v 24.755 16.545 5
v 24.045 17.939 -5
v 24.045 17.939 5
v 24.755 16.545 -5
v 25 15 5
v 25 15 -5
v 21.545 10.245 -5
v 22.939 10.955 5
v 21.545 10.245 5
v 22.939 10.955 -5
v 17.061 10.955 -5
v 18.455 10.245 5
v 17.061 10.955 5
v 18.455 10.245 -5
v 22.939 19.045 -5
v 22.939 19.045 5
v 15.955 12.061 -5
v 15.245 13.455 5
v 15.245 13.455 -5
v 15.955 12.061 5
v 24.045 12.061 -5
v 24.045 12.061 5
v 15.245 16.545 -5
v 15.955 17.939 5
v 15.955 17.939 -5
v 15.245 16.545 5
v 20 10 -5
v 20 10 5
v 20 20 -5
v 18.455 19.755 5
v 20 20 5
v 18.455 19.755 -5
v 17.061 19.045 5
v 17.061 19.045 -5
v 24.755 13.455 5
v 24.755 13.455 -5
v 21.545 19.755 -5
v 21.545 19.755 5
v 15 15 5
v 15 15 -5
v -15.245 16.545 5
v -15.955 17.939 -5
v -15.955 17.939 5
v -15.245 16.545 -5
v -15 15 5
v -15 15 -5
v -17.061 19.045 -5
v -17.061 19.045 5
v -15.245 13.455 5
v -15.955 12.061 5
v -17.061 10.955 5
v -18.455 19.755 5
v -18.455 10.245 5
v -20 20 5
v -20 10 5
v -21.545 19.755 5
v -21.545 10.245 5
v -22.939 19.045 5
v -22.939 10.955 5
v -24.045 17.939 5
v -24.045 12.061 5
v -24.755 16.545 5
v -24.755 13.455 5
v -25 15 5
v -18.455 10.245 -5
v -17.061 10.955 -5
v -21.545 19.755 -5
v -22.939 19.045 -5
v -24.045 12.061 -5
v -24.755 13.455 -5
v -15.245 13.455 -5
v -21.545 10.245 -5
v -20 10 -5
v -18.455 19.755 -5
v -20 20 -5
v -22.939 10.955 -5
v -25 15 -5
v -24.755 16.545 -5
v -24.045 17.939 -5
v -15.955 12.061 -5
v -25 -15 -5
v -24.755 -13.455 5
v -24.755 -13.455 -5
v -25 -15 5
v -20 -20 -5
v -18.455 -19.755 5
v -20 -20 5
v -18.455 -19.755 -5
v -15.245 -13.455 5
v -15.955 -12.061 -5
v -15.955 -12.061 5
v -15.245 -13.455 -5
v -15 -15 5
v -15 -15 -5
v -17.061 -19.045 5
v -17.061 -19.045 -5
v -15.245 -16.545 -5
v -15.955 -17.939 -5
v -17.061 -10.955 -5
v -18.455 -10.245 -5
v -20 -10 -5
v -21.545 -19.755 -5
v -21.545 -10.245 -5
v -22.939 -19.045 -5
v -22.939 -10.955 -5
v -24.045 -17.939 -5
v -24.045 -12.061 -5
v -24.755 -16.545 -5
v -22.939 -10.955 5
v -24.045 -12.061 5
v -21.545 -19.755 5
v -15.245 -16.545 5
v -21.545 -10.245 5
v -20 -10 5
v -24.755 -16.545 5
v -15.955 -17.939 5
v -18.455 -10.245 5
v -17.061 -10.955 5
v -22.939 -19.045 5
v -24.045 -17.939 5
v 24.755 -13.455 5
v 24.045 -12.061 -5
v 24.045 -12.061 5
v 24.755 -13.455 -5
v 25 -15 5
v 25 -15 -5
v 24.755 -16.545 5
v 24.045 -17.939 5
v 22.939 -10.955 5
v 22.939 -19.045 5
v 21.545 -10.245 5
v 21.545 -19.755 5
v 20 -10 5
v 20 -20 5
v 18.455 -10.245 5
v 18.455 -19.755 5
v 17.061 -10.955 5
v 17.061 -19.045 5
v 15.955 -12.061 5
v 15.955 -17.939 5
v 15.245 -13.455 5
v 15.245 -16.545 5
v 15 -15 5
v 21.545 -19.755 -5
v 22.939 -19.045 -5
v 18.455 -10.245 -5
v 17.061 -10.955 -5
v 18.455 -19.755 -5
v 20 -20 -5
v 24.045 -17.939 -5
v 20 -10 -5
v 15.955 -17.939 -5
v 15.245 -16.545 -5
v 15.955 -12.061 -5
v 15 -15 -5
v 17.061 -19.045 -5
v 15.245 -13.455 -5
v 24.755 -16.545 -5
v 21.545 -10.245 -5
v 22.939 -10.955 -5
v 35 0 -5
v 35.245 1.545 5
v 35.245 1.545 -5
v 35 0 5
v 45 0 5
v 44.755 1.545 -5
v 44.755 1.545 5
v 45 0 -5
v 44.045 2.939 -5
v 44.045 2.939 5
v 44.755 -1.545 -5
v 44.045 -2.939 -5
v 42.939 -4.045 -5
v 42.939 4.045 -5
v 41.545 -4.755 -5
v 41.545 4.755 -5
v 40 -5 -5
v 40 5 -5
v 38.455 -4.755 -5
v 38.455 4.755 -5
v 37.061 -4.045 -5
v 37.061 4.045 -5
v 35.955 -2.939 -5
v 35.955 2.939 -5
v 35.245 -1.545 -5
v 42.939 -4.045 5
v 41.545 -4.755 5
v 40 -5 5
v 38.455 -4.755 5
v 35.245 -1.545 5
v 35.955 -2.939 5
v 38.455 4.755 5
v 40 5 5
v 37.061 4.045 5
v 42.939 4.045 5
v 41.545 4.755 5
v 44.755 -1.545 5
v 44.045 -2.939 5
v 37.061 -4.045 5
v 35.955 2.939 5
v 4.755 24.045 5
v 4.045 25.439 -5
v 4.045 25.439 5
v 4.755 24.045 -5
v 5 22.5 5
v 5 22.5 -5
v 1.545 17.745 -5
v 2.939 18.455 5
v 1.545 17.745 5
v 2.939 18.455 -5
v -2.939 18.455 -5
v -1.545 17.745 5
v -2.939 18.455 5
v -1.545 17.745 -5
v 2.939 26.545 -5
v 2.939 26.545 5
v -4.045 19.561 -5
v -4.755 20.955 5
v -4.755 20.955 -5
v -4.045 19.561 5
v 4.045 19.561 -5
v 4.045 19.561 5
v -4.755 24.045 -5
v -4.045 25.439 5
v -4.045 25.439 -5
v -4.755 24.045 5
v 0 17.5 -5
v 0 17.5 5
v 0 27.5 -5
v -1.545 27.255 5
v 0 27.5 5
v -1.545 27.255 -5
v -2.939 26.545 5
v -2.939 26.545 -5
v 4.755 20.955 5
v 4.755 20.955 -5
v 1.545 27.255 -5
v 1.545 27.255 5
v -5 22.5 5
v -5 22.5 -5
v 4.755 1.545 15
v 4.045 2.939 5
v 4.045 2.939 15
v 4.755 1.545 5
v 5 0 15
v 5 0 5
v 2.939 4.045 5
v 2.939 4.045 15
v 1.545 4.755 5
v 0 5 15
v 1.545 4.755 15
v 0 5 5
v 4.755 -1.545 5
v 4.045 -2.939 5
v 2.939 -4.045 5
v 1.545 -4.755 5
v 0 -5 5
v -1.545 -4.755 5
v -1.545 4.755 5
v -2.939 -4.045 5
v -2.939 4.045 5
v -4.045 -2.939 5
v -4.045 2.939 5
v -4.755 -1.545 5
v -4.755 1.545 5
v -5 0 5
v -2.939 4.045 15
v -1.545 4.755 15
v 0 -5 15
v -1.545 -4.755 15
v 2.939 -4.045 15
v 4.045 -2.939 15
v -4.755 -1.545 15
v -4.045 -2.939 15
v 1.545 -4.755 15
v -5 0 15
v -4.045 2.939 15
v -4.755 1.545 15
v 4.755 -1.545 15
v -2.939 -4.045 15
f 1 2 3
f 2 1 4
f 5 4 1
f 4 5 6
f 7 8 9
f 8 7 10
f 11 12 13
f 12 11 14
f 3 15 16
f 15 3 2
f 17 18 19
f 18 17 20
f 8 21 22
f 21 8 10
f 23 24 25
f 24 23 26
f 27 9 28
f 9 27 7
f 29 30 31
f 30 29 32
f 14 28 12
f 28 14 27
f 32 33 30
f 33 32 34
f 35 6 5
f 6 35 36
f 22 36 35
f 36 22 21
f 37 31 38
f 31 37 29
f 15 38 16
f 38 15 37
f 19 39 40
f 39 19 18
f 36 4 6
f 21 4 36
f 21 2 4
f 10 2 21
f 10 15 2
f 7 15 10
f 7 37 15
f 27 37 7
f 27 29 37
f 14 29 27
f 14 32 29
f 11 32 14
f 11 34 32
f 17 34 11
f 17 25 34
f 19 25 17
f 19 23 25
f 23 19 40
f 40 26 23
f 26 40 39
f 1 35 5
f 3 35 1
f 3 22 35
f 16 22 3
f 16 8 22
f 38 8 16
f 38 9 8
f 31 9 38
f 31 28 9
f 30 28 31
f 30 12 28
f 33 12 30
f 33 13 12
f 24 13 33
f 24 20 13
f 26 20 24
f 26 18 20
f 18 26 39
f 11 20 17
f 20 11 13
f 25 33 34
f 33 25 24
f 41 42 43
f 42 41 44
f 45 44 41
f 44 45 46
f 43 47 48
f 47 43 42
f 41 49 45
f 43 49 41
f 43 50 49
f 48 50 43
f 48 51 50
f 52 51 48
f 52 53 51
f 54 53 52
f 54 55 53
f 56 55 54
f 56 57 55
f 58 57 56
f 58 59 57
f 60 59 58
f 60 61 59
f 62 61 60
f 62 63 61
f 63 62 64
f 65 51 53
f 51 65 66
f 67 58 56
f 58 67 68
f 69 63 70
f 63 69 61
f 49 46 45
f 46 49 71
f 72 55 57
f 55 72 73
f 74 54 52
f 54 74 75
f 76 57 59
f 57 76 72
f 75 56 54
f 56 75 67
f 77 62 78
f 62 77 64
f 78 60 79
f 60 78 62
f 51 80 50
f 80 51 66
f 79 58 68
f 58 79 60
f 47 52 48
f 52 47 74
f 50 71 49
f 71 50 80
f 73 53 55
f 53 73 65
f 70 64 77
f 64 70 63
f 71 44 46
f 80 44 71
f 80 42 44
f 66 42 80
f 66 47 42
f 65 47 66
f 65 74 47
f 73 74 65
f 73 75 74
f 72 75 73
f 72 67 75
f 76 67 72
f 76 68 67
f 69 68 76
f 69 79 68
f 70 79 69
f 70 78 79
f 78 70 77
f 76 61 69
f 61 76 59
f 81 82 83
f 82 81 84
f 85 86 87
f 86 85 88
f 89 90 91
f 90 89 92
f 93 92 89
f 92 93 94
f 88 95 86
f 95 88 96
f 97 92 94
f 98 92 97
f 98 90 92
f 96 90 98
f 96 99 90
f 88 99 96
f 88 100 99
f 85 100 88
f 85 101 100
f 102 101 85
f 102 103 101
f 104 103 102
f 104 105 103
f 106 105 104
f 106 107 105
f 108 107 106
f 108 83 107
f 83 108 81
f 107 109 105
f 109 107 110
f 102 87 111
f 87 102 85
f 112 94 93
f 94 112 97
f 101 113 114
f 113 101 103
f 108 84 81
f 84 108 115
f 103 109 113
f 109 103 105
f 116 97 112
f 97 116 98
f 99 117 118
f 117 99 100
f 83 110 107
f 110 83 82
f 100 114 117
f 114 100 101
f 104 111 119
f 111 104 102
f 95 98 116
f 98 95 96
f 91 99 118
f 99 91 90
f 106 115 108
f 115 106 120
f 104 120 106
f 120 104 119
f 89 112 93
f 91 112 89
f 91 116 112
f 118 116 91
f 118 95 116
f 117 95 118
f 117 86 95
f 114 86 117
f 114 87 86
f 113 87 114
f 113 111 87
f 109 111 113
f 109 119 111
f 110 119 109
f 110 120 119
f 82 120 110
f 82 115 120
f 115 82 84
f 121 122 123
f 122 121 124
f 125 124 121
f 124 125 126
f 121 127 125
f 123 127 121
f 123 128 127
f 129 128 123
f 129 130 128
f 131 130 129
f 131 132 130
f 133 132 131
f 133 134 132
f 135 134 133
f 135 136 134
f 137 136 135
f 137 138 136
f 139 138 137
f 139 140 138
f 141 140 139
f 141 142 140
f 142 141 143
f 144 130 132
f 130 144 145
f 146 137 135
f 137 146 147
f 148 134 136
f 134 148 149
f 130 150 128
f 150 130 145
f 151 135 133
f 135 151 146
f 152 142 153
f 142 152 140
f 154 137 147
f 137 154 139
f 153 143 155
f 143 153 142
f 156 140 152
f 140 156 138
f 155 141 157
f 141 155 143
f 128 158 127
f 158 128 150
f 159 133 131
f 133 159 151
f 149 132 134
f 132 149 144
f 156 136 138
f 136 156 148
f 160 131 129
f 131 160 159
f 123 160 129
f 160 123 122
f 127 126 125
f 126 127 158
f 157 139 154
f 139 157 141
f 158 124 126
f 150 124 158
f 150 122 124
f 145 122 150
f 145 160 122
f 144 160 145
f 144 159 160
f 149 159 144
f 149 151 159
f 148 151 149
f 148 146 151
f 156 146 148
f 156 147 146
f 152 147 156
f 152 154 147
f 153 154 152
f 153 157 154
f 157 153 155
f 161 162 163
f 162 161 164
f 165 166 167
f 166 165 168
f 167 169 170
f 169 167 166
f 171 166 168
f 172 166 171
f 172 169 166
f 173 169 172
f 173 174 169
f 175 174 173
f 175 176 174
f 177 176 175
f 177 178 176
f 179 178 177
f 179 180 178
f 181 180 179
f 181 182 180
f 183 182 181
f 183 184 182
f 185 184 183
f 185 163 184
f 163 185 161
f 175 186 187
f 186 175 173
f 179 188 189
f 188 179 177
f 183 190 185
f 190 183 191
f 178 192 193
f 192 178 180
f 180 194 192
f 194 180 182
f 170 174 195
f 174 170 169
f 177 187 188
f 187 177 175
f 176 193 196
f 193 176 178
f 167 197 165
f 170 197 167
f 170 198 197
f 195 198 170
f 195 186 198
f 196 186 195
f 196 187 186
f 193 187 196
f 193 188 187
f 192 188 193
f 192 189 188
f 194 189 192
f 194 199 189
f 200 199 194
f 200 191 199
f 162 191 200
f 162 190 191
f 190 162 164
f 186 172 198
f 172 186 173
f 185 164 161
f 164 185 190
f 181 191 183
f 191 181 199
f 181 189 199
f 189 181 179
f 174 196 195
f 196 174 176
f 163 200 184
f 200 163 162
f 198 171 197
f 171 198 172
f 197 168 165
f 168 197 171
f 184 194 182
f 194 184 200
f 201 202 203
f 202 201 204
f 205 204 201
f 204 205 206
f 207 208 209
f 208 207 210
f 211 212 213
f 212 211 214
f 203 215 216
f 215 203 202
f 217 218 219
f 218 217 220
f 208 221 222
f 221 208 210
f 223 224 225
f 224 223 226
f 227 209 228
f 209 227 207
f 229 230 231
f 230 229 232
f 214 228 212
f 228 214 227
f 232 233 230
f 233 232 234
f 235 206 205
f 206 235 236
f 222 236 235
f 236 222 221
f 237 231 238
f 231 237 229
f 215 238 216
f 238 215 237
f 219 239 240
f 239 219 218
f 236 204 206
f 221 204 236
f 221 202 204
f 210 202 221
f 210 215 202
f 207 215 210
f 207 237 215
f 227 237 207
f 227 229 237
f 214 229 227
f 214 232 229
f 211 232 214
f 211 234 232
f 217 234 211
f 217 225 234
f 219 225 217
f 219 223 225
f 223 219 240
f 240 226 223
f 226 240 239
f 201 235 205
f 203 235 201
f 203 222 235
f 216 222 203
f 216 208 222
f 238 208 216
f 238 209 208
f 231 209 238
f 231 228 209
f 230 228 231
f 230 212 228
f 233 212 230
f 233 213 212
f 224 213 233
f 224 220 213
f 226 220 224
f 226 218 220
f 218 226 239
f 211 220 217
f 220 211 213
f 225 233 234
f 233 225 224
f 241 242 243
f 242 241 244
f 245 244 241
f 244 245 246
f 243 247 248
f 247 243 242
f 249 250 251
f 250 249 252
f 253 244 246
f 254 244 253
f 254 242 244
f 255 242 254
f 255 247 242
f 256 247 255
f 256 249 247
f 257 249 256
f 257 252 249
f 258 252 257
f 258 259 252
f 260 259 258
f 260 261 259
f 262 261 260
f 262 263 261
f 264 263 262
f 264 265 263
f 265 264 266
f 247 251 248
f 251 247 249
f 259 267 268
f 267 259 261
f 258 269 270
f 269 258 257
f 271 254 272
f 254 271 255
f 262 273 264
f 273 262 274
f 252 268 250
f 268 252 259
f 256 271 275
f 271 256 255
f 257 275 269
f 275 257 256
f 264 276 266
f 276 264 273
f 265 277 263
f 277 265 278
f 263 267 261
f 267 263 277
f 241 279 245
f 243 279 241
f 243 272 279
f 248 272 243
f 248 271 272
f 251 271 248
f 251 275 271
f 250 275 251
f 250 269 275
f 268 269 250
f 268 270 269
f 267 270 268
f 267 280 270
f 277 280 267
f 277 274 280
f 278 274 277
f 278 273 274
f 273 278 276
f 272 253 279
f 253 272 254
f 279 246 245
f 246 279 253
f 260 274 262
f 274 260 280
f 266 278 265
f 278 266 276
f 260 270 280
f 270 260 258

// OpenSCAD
//-- Parametros
r = 5;    //-- Radio del redondeo de las esquinas
h = 10;   //-- Altura

//-- Coordenadas del cilindro del primer cuadrante
cx = 20;
cy = 15;

//-- Vector de puntos, con las posiciones de los cilindros
POINT = [
  [cx, cy, 0],    //-- Punto 0
  [-cx, cy, 0],   //-- Punto 1
  [-cx, -cy, 0],  //-- Punto 2
  [cx, -cy, 0],   //-- Punto 3
  [2*cx, 0, 0],   //-- Punto 4
  [0, 1.5*cy, 0], //-- Punto 5
  [0,0,h],        //-- Punto 6
];  


//-- Obtener el menor objeto convexo que contiene
//--   los cilindros situados en los puntos indicados en 
//-- el vector POINT

%hull() {

  //-- Dibujar cada cilindro en su posicion correspondiente
  for (pos = POINT) 
    translate(pos)
      cylinder(r = r, h = h, center = true, $fn = 20);
}


//-- Dibujar cada cilindro en su posicion correspondiente
  for (pos = POINT) 
    translate(pos)
      cylinder(r = r, h = h, center = true, $fn = 20);
